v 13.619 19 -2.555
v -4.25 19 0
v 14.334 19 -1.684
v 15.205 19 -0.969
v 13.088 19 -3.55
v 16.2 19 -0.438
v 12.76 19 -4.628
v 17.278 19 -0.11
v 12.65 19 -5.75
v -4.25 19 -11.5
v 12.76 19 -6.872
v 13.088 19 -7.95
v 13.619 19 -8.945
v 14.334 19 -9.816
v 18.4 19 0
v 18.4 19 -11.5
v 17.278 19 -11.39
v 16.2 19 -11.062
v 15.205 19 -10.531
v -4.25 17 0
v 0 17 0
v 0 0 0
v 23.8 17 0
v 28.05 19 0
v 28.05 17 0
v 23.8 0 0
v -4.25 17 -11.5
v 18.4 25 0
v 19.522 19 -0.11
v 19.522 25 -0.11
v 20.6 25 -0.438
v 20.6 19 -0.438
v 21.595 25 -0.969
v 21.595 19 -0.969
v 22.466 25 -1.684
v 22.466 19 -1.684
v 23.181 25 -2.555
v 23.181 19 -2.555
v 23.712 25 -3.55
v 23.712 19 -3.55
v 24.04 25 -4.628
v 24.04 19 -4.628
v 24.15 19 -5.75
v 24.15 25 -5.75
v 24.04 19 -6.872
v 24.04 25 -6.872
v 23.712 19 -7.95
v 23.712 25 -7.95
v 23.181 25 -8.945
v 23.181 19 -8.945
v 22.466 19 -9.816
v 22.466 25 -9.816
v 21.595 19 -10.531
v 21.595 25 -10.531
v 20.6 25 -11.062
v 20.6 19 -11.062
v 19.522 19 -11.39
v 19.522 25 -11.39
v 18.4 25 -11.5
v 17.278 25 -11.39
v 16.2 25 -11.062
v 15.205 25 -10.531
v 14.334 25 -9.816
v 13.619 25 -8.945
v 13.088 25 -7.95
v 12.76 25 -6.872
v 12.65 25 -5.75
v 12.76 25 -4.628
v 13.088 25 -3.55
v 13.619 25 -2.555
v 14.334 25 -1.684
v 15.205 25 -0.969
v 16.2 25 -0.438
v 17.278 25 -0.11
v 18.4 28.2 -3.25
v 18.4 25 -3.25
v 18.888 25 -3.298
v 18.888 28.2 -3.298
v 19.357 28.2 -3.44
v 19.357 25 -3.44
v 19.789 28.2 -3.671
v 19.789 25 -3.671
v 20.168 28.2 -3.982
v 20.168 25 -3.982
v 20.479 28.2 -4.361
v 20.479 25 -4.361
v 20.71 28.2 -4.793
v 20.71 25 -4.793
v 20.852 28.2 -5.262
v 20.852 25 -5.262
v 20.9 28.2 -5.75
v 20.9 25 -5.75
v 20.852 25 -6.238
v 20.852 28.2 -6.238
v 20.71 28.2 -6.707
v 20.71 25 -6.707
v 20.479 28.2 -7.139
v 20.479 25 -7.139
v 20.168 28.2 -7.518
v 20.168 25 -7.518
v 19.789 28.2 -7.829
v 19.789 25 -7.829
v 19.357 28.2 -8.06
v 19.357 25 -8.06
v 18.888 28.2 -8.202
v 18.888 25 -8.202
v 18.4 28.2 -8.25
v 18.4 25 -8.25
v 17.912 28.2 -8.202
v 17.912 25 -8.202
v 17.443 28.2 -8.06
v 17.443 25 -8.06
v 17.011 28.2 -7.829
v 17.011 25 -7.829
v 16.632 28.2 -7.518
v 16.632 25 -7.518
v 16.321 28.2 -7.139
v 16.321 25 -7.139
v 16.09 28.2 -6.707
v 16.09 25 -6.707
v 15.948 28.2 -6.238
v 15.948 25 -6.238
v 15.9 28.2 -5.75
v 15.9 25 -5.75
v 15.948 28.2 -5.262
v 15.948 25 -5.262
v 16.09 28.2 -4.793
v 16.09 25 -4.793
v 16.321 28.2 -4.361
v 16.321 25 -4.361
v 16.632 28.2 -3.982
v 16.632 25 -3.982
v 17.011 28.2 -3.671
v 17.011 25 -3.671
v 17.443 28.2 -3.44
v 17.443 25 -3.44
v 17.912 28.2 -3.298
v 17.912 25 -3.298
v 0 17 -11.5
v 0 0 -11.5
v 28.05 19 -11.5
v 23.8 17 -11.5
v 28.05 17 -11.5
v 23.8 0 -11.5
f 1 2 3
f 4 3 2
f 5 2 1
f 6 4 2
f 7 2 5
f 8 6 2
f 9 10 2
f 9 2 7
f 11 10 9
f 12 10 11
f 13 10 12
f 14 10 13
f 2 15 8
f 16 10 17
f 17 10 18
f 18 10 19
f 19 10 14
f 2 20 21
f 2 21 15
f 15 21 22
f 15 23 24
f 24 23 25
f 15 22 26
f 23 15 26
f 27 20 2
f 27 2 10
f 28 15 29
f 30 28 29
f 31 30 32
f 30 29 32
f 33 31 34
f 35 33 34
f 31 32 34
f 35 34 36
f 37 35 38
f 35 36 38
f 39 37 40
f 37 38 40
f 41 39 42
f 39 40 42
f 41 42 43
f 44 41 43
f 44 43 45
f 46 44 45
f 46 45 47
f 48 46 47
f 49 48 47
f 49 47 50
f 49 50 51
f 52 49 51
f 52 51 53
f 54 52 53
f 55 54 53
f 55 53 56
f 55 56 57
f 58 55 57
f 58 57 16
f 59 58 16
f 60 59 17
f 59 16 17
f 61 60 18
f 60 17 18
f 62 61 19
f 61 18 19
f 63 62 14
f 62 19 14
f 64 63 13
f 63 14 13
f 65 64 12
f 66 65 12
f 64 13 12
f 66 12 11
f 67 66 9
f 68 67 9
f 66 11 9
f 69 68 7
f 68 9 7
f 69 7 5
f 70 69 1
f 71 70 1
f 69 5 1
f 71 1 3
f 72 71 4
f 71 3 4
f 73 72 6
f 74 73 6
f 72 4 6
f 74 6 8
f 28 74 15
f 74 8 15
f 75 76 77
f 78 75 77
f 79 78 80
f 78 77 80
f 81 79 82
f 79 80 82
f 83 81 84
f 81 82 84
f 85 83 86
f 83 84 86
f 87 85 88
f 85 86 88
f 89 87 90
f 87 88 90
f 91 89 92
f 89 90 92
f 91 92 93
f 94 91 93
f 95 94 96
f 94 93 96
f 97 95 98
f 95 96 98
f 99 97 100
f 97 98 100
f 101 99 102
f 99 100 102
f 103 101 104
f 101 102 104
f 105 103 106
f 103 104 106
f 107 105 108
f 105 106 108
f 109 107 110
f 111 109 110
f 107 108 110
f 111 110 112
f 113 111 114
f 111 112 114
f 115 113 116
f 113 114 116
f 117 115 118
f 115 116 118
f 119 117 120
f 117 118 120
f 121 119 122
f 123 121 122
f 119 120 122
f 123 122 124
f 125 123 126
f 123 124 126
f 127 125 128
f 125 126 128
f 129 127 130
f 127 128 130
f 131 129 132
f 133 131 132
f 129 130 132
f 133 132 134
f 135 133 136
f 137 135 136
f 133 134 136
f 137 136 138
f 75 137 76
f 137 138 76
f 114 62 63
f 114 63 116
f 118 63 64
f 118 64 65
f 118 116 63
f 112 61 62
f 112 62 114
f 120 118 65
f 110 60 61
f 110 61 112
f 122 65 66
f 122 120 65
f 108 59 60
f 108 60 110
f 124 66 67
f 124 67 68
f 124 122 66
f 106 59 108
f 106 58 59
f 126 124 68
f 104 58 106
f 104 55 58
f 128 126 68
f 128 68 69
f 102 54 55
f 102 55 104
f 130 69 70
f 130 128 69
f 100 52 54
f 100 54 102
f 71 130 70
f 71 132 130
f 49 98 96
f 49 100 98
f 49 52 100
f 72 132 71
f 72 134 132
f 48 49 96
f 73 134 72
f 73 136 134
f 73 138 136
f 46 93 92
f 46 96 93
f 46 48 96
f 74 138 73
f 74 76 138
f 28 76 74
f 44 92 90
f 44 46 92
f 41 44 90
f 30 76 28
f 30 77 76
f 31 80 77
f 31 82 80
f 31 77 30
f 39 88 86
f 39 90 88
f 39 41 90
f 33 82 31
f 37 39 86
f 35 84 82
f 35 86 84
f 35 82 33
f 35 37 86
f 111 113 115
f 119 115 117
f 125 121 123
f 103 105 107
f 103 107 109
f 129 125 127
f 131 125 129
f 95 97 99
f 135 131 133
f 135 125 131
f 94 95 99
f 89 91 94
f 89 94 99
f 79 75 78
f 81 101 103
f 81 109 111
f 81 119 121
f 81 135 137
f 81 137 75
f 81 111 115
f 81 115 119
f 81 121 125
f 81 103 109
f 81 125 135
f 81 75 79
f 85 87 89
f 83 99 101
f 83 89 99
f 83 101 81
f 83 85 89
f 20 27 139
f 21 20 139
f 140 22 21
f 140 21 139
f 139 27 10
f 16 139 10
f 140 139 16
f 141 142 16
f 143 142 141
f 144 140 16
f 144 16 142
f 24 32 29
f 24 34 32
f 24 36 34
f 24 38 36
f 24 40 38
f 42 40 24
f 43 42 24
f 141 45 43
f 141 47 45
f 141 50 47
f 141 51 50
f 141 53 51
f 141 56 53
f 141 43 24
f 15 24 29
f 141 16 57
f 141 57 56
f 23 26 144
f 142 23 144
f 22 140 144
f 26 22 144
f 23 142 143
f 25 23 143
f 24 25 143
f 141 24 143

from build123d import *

# Parameters (mm, degrees)
SKETCH1_W           = 23.8
SKETCH1_H           = 11.5
BOSS_EXTRUDE1_DEPTH = 17
SKETCH2_W           = 32.3
SKETCH2_H           = 11.5
BOSS_EXTRUDE2_DEPTH = 2
SKETCH3_R           = 5.75
BOSS_EXTRUDE3_DEPTH = 6
SKETCH4_R           = 2.5
BOSS_EXTRUDE4_DEPTH = 3.2


with BuildPart() as part:
    # Sketch1 → Boss-Extrude1 (new body)
    with BuildSketch(Plane(origin=(0, 0, 0), x_dir=(1, 0, 0), z_dir=(0, 1, 0))):
        with Locations((11.9, 5.75)):
            Rectangle(SKETCH1_W, SKETCH1_H)
    extrude(amount=BOSS_EXTRUDE1_DEPTH)

    # Sketch2 → Boss-Extrude2 (add)
    with BuildSketch(Plane(origin=(0, 17, 0), x_dir=(1, 0, 0), z_dir=(0, 1, 0))):
        with Locations((11.9, 5.75)):
            Rectangle(SKETCH2_W, SKETCH2_H)
    extrude(amount=BOSS_EXTRUDE2_DEPTH)

    # Sketch3 → Boss-Extrude3 (add)
    with BuildSketch(Plane(origin=(0, 19, 0), x_dir=(1, 0, 0), z_dir=(0, 1, 0))):
        with Locations(Location((18.4, 5.75, 0), (0, 0, 270))):
            Circle(SKETCH3_R)
    extrude(amount=BOSS_EXTRUDE3_DEPTH)

    # Sketch4 → Boss-Extrude4 (add)
    with BuildSketch(Plane(origin=(0, 25, 0), x_dir=(1, 0, 0), z_dir=(0, 1, 0))):
        with Locations(Location((18.4, 5.75, 0), (0, 0, 270))):
            Circle(SKETCH4_R)
    extrude(amount=BOSS_EXTRUDE4_DEPTH)


solid = part.part
